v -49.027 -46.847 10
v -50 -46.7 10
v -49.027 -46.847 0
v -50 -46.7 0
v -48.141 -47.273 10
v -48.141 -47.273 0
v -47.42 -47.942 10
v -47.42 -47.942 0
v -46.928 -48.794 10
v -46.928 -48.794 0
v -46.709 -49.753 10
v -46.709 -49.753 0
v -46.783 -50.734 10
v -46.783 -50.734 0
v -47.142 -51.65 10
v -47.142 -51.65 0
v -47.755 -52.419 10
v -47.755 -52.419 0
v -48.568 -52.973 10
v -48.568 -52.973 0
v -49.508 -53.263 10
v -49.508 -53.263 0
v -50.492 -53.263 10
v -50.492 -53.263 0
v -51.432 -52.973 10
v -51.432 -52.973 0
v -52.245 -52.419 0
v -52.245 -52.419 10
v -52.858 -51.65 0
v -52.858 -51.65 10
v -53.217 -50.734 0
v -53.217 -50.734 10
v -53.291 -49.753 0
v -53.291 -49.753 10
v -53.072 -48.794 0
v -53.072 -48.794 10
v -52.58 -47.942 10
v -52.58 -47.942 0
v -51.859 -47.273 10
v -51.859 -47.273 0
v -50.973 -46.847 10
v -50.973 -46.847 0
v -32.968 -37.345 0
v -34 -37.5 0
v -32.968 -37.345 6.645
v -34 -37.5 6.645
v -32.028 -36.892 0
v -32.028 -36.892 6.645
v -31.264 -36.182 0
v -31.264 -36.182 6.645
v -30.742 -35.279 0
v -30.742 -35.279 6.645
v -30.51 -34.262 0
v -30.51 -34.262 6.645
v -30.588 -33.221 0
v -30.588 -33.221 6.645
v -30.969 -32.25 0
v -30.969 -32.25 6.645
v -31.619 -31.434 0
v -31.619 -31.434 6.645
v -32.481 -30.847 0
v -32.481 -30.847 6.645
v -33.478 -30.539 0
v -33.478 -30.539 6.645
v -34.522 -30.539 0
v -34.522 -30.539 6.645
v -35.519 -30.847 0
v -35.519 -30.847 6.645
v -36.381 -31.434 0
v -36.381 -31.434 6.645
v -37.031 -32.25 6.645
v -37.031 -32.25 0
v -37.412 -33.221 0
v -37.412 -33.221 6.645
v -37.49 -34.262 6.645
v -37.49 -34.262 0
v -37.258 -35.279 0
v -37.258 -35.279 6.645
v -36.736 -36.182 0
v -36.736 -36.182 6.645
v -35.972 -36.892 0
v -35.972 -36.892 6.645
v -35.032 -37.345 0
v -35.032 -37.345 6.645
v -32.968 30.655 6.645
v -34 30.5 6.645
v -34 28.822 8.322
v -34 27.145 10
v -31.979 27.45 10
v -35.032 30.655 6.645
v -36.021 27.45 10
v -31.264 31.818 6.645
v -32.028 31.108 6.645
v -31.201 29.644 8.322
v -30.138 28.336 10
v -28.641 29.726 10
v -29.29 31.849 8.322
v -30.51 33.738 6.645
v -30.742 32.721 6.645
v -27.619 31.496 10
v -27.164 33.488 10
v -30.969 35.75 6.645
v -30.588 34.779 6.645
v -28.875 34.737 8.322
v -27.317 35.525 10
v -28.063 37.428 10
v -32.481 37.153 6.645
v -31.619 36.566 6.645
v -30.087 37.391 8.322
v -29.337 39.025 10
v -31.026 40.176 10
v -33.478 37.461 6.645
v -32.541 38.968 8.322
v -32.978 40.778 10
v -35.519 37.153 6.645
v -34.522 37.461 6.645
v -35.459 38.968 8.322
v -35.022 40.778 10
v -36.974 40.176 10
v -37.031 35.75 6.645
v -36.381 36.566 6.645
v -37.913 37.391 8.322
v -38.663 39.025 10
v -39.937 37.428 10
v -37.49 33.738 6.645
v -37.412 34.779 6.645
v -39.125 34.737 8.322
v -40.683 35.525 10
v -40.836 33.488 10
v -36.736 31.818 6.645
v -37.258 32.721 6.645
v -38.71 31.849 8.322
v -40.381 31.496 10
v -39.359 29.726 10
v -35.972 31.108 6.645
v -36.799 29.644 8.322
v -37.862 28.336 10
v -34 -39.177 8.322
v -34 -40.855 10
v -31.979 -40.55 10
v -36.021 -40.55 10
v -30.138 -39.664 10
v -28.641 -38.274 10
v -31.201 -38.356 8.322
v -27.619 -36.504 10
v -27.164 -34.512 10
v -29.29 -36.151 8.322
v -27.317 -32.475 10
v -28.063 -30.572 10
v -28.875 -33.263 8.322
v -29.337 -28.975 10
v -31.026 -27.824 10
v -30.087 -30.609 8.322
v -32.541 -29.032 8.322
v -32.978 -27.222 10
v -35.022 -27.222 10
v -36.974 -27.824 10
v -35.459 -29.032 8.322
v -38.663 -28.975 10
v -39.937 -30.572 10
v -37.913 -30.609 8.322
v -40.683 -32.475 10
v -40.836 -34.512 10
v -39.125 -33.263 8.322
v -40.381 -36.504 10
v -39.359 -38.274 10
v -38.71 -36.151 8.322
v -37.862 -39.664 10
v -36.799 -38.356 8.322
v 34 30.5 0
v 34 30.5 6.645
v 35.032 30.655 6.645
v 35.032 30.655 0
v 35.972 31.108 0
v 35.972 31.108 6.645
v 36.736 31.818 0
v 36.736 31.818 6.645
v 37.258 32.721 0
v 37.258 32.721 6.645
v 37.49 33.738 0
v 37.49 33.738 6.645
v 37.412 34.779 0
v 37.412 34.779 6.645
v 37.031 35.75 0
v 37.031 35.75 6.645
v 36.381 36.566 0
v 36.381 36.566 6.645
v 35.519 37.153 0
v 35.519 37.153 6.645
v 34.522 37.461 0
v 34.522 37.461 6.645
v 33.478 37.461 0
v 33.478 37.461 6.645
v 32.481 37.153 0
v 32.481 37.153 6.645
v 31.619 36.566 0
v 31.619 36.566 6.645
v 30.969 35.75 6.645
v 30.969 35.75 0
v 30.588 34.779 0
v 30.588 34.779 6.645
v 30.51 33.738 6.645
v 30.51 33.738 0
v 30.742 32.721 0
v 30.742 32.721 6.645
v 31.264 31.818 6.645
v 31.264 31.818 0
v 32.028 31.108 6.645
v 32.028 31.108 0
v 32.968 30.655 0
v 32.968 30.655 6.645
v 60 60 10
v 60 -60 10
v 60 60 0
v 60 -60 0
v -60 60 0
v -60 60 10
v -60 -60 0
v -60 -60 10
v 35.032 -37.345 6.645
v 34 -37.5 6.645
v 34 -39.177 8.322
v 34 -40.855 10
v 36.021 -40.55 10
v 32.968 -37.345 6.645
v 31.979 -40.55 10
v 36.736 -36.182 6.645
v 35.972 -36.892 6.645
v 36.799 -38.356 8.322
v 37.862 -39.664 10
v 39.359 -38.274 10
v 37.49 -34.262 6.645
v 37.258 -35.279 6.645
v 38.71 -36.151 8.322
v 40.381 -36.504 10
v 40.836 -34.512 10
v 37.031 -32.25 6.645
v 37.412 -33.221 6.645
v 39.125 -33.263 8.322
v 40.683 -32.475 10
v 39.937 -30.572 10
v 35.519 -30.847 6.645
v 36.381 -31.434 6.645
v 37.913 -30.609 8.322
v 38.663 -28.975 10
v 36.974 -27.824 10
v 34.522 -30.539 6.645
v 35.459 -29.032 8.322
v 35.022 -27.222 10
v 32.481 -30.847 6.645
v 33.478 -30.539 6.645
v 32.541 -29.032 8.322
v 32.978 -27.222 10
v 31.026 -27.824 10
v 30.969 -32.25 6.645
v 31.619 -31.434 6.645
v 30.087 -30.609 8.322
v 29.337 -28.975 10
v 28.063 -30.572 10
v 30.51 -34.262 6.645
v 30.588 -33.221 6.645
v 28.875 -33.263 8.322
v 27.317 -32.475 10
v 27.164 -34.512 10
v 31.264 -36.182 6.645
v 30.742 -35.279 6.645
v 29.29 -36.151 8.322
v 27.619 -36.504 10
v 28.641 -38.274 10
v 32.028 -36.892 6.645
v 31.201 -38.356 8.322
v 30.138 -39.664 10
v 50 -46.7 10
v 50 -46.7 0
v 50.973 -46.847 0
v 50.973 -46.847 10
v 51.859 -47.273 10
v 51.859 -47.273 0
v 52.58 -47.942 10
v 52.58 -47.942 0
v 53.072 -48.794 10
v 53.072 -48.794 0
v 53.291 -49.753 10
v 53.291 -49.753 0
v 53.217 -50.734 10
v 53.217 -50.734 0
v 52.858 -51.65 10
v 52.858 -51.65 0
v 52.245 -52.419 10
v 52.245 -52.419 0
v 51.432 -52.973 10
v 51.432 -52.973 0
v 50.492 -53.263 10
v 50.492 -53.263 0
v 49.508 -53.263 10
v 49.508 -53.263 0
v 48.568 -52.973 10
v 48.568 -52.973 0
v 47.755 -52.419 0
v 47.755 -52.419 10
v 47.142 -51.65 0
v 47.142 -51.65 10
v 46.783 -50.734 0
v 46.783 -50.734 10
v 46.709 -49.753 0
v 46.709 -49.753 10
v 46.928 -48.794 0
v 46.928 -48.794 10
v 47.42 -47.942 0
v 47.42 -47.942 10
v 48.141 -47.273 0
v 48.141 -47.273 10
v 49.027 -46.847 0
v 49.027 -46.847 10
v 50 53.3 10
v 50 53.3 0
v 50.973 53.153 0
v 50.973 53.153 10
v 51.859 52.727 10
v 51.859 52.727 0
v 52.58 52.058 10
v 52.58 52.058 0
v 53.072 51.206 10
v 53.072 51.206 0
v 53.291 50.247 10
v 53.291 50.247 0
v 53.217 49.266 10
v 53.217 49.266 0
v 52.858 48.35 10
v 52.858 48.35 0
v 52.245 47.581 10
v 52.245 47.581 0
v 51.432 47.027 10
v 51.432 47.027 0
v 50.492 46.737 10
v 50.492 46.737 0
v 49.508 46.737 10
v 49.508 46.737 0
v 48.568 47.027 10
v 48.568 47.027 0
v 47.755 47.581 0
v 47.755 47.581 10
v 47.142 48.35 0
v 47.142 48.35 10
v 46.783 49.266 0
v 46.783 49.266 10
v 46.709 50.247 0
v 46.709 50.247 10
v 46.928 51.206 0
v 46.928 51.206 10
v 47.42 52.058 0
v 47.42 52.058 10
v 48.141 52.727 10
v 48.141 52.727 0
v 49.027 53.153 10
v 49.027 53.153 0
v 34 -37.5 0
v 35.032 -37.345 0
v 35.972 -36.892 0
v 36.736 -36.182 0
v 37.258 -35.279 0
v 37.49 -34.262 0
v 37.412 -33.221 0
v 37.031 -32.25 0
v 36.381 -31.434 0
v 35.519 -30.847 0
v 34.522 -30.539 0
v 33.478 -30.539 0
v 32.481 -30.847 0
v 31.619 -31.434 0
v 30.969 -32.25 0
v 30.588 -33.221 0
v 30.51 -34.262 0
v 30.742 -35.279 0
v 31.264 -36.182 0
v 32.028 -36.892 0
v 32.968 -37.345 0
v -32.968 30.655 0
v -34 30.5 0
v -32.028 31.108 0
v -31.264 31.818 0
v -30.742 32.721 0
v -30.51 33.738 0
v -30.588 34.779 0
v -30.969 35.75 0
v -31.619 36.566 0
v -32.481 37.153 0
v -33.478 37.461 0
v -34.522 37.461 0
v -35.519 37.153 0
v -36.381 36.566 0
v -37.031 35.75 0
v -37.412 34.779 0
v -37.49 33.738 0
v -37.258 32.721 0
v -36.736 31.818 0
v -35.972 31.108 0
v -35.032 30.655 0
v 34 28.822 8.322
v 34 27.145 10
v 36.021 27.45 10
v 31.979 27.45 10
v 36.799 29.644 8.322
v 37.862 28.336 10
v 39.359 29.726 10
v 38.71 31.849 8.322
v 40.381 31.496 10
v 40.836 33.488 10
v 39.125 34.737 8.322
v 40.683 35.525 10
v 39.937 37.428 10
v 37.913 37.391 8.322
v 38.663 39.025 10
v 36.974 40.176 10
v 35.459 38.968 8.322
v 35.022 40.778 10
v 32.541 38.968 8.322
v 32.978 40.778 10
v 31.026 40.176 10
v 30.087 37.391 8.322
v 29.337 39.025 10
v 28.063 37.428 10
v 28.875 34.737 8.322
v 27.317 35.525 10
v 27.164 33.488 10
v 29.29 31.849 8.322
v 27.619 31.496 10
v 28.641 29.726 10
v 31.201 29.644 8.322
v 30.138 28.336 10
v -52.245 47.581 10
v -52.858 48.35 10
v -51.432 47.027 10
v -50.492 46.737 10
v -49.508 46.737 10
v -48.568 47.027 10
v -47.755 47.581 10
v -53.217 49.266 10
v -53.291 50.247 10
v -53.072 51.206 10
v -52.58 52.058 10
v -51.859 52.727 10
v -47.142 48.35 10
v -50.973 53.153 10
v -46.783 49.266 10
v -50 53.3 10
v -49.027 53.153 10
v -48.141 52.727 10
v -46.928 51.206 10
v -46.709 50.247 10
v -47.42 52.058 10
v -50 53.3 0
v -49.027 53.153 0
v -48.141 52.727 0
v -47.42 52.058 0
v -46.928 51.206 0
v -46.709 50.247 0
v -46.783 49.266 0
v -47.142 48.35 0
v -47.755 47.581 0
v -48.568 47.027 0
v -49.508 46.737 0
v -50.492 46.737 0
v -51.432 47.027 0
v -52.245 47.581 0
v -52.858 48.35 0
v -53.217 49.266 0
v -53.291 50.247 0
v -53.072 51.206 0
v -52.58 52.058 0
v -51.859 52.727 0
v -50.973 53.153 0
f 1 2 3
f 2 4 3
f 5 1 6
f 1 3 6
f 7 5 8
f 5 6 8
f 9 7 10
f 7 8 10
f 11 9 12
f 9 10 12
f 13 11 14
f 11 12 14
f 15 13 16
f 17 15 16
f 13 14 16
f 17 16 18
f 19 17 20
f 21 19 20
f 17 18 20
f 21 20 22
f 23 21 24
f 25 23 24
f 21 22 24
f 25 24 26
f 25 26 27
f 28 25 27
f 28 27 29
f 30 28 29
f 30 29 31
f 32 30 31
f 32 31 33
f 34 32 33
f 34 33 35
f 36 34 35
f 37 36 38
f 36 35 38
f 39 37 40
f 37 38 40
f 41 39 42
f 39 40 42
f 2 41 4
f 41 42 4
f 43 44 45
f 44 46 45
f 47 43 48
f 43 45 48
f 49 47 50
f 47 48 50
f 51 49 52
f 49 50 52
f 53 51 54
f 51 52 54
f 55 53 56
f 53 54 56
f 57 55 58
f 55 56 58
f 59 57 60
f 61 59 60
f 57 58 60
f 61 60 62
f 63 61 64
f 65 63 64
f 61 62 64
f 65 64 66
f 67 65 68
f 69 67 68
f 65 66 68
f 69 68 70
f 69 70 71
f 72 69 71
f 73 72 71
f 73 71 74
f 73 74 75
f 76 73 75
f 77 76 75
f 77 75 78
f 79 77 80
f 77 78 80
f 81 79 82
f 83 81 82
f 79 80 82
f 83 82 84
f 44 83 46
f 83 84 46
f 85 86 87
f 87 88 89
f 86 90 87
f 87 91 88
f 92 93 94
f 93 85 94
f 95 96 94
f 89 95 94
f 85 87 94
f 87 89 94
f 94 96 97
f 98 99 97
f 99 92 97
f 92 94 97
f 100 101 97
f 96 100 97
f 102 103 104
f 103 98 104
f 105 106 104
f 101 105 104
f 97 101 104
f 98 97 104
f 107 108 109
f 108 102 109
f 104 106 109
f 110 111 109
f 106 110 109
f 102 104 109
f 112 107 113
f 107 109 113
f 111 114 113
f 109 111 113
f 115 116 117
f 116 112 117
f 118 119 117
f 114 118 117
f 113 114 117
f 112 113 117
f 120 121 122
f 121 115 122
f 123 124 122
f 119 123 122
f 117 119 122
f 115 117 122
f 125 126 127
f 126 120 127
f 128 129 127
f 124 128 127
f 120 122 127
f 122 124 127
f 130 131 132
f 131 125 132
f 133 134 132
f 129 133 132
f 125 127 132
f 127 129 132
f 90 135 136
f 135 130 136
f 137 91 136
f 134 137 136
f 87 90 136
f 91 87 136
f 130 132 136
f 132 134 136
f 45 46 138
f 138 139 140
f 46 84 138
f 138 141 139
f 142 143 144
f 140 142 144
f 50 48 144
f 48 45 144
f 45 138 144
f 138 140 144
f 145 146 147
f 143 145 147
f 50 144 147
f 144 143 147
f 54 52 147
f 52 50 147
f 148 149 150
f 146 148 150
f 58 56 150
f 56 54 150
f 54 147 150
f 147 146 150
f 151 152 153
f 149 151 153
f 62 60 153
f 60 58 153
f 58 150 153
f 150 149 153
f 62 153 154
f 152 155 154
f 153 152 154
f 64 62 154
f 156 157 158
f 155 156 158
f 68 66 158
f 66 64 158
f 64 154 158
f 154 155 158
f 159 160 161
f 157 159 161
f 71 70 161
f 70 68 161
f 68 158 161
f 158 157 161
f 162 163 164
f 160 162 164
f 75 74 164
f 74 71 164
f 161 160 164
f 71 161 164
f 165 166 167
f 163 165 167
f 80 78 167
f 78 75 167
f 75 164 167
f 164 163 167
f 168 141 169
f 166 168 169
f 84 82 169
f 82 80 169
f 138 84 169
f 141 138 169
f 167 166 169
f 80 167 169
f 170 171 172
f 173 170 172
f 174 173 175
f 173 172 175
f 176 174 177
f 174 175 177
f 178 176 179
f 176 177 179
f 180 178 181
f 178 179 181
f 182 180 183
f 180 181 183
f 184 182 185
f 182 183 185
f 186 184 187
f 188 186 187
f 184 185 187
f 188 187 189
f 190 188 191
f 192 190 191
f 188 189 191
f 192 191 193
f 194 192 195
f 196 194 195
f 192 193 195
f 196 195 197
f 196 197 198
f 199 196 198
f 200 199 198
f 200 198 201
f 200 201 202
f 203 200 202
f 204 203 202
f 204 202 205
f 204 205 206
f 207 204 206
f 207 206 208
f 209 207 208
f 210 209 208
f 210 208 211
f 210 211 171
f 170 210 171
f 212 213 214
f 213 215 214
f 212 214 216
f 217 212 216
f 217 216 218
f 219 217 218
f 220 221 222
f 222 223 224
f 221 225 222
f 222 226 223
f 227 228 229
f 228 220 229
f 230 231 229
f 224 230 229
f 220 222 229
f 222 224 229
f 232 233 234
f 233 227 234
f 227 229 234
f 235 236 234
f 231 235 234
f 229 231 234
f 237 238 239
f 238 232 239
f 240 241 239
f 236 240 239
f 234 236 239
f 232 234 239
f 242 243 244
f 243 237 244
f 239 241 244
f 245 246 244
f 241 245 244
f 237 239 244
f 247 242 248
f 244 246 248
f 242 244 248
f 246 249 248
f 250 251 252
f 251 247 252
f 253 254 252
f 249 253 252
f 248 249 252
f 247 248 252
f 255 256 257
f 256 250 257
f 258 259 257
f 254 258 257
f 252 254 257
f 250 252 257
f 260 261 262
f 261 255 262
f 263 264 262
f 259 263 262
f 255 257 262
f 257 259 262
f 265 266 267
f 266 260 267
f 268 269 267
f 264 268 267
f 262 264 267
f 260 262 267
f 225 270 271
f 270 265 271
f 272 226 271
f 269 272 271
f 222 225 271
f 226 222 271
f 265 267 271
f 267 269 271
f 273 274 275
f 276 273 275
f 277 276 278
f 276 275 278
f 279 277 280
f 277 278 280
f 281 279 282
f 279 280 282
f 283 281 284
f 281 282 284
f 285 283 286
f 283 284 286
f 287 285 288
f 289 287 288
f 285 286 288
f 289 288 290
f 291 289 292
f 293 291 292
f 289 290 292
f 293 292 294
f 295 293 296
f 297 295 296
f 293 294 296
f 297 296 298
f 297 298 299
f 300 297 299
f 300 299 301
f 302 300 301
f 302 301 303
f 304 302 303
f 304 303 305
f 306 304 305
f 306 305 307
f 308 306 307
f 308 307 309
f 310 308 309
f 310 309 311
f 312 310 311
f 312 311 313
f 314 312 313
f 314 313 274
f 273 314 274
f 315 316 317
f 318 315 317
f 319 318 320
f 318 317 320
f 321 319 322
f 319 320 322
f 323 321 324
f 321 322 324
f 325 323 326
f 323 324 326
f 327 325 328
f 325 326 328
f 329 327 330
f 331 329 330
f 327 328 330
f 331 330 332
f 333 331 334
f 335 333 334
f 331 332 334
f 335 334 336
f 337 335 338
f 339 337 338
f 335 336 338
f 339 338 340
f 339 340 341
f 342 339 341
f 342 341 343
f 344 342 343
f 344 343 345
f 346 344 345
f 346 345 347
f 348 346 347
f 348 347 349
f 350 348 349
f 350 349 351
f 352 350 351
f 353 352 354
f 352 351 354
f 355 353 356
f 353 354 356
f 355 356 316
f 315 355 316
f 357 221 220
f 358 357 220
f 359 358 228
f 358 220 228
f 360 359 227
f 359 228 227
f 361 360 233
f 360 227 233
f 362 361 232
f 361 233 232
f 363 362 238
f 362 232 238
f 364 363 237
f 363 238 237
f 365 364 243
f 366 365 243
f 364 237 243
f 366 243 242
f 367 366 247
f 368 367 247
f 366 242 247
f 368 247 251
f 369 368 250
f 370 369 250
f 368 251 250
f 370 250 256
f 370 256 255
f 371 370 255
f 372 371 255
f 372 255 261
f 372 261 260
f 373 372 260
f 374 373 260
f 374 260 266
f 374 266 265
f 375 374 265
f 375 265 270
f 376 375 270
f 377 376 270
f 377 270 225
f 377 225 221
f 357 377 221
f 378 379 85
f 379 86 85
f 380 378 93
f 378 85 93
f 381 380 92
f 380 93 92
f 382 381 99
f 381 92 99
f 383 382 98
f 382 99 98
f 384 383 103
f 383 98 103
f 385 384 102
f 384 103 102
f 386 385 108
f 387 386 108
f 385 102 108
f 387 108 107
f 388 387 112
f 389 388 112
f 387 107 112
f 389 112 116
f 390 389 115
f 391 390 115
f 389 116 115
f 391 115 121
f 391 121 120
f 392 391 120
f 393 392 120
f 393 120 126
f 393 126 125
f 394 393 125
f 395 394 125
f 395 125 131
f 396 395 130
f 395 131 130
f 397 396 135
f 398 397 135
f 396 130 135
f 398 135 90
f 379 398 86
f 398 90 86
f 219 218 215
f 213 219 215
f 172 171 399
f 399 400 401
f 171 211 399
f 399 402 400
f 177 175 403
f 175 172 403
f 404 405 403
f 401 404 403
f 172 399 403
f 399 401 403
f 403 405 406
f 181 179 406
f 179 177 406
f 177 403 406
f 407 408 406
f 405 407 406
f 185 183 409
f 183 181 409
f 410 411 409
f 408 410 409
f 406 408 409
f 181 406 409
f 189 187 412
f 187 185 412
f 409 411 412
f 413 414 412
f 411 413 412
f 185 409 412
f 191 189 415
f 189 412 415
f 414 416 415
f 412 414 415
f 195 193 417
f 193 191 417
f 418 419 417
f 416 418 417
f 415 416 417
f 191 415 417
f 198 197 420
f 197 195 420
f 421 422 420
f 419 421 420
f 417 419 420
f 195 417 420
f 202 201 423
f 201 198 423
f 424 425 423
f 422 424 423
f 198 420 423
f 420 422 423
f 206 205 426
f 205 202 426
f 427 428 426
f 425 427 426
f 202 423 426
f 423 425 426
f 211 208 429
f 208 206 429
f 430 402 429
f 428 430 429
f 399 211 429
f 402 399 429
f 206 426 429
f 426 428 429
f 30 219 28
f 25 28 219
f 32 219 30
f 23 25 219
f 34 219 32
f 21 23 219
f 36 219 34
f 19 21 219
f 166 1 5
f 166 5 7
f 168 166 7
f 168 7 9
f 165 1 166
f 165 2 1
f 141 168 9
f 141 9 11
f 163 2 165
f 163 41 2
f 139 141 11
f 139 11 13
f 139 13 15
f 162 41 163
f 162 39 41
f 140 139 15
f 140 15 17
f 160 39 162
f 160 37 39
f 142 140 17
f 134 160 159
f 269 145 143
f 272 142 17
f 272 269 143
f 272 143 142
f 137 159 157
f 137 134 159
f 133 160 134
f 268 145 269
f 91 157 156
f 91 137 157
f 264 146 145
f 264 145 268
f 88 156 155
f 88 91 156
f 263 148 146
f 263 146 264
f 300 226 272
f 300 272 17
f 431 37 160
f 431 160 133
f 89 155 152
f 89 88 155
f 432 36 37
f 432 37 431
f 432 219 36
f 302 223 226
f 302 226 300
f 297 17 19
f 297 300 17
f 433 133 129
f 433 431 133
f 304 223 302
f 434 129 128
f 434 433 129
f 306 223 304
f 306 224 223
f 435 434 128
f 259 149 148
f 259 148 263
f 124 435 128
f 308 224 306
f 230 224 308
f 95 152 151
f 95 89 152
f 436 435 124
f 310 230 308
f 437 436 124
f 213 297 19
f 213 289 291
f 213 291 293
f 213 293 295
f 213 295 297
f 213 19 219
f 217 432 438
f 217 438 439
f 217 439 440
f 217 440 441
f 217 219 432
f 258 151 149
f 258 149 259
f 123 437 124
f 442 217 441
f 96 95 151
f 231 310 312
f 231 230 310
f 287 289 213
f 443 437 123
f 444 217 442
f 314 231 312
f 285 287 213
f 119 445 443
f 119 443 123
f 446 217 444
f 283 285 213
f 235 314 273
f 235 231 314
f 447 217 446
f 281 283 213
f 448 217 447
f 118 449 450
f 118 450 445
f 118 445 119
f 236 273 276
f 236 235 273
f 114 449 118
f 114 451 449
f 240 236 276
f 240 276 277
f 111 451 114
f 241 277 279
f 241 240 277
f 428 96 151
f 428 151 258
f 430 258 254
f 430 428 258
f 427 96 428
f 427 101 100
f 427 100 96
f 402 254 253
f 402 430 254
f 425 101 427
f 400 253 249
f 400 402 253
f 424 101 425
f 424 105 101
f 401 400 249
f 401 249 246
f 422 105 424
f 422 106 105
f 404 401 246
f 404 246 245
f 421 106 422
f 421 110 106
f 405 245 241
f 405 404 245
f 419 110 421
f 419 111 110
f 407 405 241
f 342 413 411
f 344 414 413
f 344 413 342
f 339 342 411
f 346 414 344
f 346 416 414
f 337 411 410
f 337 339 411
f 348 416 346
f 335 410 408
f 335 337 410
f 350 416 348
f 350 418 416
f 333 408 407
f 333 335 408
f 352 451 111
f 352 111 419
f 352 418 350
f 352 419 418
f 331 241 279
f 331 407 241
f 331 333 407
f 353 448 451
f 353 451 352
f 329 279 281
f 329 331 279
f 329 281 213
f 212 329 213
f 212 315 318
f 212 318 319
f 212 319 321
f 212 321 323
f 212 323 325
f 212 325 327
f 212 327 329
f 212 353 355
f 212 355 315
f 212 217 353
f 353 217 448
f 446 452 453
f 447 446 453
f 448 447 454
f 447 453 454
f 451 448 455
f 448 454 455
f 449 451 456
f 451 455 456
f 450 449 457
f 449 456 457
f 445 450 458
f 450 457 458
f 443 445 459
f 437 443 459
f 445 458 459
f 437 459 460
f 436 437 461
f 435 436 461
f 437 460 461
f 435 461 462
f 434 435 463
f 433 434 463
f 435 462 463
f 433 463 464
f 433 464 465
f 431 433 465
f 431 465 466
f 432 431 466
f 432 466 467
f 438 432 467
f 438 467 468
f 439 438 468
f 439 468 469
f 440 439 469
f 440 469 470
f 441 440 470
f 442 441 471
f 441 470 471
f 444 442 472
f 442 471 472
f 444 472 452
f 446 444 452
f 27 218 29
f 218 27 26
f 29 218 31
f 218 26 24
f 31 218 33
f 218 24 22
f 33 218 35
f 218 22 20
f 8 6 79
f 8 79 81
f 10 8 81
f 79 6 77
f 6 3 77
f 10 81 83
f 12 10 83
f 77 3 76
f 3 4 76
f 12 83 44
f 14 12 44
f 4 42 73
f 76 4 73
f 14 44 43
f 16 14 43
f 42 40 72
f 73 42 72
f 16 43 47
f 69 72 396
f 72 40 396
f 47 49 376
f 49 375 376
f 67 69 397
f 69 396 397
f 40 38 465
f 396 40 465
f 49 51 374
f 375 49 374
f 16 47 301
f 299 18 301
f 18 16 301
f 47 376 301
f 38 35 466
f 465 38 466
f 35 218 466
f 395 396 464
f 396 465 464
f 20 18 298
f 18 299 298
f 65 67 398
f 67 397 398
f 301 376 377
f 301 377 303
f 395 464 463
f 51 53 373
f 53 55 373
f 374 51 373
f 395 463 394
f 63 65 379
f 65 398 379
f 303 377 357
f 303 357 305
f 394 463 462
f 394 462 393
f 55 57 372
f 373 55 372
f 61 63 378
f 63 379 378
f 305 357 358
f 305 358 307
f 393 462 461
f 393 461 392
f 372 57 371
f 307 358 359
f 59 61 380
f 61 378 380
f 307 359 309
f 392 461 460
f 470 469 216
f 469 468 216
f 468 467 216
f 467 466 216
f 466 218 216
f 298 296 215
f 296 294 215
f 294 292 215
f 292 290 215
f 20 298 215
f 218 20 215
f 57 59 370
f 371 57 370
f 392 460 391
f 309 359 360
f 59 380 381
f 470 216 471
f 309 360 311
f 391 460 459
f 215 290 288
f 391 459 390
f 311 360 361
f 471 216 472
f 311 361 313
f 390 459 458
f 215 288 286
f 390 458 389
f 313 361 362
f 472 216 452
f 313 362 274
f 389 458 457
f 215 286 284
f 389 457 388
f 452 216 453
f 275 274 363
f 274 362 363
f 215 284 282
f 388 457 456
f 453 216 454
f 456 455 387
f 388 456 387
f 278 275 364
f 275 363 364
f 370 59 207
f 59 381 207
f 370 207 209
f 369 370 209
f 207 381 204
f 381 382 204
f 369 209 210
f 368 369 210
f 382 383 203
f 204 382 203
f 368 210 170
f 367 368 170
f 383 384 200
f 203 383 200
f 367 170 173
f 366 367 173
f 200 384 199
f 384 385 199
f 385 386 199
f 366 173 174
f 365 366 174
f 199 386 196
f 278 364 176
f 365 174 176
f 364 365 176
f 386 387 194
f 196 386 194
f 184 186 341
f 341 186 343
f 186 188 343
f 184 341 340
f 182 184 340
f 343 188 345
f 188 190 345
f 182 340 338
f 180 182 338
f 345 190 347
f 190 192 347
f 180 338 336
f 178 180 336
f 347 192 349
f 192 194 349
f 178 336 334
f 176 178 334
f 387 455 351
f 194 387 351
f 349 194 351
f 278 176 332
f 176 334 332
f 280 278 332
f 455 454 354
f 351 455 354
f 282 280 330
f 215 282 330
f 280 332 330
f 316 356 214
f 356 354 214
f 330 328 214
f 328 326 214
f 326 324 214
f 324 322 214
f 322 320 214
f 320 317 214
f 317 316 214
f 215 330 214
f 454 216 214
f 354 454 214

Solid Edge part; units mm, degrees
sketch "Sketch1" plane through (0, 0, 0) normal (0, 0, 1) x (1, 0, 0)
  line L0 (-60, -60) -> (60, -60)
  line L1 (60, -60) -> (60, 60)
  line L2 (60, 60) -> (-60, 60)
  line L3 (-60, 60) -> (-60, -60)
extrude "Extrusionsausprägung_20" add sketch "Sketch1" along normal blind 10
hole "Bohrung_4" at (34, -34, 10) direction (0, 0, -1) diameter 7 end up to next countersink diameter 13.71 countersink angle 90
hole "Hole1" at (34, 34, 10) direction (0, 0, -1) diameter 7 end up to next countersink diameter 13.71 countersink angle 90
hole "Hole2" at (-34, 34, 10) direction (0, 0, -1) diameter 7 end up to next countersink diameter 13.71 countersink angle 90
hole "Hole3" at (-34, -34, 10) direction (0, 0, -1) diameter 7 end up to next countersink diameter 13.71 countersink angle 90
hole "Bohrung_12" at (-50, -50, 0) direction (0, 0, 1) diameter 6.6 end up to next
hole "Hole4" at (50, -50, 0) direction (0, 0, 1) diameter 6.6 end up to next
hole "Hole5" at (50, 50, 0) direction (0, 0, 1) diameter 6.6 end up to next
hole "Hole6" at (-50, 50, 0) direction (0, 0, 1) diameter 6.6 end up to next
